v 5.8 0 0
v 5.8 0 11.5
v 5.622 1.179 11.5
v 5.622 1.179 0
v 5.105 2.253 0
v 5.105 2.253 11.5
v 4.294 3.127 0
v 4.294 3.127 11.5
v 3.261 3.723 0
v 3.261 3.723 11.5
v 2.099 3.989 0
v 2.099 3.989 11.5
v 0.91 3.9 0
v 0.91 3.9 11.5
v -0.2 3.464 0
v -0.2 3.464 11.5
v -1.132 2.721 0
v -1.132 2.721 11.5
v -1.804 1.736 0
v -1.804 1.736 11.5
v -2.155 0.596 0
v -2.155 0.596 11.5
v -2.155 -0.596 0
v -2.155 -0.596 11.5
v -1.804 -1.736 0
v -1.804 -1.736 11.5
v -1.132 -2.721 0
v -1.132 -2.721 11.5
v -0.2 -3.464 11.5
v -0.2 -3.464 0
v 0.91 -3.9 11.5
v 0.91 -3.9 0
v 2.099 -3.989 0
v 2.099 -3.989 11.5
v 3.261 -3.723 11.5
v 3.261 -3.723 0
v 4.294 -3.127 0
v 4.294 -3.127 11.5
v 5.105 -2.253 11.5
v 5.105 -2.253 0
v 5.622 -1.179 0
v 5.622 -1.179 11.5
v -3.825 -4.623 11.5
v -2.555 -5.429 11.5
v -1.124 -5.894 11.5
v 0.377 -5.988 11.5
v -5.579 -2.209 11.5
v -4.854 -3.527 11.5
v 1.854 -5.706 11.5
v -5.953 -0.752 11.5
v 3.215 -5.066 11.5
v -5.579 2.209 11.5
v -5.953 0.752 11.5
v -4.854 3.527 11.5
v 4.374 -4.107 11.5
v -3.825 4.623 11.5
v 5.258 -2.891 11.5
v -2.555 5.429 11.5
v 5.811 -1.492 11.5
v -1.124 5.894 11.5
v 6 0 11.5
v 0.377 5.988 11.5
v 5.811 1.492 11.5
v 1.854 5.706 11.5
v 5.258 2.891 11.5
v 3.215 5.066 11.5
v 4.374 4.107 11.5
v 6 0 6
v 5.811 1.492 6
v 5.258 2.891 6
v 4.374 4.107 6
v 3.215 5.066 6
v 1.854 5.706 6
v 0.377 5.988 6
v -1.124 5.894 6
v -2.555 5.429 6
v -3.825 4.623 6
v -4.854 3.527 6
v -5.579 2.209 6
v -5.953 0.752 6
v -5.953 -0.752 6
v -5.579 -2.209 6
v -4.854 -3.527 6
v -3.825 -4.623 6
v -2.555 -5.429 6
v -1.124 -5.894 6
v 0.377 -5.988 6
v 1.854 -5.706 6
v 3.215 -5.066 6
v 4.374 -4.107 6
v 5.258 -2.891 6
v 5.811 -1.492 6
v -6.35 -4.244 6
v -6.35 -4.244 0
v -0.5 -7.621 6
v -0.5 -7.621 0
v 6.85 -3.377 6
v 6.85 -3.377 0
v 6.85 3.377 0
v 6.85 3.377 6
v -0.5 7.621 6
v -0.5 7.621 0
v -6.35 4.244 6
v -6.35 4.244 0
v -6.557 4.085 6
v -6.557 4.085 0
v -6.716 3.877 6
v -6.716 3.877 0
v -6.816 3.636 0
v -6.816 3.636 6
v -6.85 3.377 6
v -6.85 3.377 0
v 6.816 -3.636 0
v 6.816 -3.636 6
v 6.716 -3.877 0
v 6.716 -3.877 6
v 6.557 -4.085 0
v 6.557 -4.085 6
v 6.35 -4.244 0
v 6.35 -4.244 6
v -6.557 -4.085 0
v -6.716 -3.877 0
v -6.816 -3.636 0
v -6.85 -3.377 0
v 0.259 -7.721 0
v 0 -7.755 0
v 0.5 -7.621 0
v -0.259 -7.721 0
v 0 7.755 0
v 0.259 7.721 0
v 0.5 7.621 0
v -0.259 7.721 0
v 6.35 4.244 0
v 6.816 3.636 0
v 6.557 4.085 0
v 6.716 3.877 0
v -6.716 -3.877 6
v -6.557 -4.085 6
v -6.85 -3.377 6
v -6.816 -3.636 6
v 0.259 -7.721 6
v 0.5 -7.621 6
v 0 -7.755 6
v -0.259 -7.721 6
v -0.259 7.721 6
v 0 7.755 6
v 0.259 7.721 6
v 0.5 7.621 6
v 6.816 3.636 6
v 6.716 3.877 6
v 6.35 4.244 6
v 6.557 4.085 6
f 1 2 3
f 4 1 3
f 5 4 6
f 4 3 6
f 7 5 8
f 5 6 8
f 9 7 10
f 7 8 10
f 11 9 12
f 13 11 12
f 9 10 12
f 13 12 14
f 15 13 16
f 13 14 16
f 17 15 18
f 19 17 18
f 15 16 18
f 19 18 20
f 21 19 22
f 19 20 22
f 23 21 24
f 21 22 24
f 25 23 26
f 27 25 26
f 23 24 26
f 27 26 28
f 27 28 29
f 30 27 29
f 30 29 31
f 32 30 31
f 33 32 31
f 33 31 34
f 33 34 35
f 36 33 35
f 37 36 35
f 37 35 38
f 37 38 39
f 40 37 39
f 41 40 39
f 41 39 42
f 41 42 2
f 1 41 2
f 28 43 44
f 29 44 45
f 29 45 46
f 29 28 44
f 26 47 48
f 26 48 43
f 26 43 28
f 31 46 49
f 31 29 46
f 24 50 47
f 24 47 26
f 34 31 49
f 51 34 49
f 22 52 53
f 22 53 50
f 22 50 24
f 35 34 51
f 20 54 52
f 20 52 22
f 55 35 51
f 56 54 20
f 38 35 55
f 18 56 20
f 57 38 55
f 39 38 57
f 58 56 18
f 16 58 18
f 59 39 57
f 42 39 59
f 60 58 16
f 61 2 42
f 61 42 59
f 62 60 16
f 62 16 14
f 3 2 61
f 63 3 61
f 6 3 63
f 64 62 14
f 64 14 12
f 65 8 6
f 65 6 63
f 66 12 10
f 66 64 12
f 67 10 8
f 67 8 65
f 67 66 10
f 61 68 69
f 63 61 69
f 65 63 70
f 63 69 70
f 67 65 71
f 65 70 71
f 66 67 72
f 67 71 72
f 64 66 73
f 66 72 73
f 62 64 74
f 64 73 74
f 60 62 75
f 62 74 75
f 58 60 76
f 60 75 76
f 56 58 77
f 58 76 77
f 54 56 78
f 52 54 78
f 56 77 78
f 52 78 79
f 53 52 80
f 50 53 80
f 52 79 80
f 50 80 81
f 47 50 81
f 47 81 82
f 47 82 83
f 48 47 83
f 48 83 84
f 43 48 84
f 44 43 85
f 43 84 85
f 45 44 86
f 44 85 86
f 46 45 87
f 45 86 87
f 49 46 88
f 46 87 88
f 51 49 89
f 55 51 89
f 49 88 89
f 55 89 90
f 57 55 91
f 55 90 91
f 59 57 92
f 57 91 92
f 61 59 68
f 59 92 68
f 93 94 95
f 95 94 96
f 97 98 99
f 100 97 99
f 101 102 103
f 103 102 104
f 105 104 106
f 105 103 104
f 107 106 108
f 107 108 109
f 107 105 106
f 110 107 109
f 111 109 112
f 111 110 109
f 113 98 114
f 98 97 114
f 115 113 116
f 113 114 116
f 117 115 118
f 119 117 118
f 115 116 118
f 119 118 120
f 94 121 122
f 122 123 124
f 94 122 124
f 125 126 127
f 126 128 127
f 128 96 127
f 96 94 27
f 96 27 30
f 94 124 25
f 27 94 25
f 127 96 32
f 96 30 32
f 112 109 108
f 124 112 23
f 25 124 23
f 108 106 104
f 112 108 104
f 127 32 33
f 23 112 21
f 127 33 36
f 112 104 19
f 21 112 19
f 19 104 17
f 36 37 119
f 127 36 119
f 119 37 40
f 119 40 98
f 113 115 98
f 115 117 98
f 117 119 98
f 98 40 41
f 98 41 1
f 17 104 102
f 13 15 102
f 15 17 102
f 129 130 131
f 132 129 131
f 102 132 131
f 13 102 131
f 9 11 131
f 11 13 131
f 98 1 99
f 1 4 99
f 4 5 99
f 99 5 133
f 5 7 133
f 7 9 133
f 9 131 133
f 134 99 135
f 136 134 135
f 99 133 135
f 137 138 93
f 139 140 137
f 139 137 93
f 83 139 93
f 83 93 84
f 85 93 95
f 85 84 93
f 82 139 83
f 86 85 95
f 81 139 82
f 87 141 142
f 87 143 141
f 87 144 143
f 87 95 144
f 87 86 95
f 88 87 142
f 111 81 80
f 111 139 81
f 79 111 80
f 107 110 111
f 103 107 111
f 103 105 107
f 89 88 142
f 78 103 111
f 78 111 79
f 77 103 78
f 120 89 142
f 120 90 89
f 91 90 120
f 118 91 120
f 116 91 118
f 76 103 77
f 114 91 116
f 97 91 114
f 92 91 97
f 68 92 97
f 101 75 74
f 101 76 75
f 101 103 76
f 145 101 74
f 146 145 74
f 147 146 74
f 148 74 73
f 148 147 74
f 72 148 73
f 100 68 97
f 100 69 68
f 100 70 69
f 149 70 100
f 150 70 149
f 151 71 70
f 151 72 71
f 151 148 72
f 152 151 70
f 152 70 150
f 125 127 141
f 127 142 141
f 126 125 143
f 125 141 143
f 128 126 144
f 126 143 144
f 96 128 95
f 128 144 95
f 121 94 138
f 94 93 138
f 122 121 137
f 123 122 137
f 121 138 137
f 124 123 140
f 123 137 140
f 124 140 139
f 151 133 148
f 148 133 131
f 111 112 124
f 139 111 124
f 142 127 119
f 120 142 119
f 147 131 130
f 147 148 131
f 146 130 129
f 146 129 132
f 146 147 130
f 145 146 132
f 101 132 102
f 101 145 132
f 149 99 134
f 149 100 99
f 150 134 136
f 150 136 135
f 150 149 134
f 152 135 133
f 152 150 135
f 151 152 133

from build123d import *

# Parameters (mm, degrees)
F1_DEPTH = 6
F2_R     = 6
F3_DEPTH = 5.5
F4_R     = 4
F5_DEPTH = 11.501
F6_R     = 1


with BuildPart() as f1:
    # F0 (on Top) → F1 (new body)
    with BuildSketch(Plane.XY):
        Polygon((6.85, -3.954849), (6.85, 3.954849), (0, 7.909699), (-6.85, 3.954849), (-6.85, -3.954849), (0, -7.909699), align=None)
    extrude(amount=F1_DEPTH)

    # F2 (on face) → F3 (join)
    with BuildSketch(Plane.XY.offset(6)):
        Circle(F2_R)
    extrude(amount=F3_DEPTH)

    # F4 (on face) → F5 (cut, through all)
    with BuildSketch(Plane.XY.offset(11.5)):
        with Locations((1.8, 0)):
            Circle(F4_R)
    extrude(amount=-F5_DEPTH, mode=Mode.SUBTRACT)

    # F6
    f6_edges = [f1.edges().sort_by_distance(p)[0] for p in [
        (6.85, -3.954849, 3),
        (0, -7.909699, 3),
        (6.85, 3.954849, 3),
        (-6.85, -3.954849, 3),
        (-6.85, 3.954849, 3),
        (0, 7.909699, 3),
    ]]
    fillet(f6_edges, radius=F6_R)


solid = f1.part
